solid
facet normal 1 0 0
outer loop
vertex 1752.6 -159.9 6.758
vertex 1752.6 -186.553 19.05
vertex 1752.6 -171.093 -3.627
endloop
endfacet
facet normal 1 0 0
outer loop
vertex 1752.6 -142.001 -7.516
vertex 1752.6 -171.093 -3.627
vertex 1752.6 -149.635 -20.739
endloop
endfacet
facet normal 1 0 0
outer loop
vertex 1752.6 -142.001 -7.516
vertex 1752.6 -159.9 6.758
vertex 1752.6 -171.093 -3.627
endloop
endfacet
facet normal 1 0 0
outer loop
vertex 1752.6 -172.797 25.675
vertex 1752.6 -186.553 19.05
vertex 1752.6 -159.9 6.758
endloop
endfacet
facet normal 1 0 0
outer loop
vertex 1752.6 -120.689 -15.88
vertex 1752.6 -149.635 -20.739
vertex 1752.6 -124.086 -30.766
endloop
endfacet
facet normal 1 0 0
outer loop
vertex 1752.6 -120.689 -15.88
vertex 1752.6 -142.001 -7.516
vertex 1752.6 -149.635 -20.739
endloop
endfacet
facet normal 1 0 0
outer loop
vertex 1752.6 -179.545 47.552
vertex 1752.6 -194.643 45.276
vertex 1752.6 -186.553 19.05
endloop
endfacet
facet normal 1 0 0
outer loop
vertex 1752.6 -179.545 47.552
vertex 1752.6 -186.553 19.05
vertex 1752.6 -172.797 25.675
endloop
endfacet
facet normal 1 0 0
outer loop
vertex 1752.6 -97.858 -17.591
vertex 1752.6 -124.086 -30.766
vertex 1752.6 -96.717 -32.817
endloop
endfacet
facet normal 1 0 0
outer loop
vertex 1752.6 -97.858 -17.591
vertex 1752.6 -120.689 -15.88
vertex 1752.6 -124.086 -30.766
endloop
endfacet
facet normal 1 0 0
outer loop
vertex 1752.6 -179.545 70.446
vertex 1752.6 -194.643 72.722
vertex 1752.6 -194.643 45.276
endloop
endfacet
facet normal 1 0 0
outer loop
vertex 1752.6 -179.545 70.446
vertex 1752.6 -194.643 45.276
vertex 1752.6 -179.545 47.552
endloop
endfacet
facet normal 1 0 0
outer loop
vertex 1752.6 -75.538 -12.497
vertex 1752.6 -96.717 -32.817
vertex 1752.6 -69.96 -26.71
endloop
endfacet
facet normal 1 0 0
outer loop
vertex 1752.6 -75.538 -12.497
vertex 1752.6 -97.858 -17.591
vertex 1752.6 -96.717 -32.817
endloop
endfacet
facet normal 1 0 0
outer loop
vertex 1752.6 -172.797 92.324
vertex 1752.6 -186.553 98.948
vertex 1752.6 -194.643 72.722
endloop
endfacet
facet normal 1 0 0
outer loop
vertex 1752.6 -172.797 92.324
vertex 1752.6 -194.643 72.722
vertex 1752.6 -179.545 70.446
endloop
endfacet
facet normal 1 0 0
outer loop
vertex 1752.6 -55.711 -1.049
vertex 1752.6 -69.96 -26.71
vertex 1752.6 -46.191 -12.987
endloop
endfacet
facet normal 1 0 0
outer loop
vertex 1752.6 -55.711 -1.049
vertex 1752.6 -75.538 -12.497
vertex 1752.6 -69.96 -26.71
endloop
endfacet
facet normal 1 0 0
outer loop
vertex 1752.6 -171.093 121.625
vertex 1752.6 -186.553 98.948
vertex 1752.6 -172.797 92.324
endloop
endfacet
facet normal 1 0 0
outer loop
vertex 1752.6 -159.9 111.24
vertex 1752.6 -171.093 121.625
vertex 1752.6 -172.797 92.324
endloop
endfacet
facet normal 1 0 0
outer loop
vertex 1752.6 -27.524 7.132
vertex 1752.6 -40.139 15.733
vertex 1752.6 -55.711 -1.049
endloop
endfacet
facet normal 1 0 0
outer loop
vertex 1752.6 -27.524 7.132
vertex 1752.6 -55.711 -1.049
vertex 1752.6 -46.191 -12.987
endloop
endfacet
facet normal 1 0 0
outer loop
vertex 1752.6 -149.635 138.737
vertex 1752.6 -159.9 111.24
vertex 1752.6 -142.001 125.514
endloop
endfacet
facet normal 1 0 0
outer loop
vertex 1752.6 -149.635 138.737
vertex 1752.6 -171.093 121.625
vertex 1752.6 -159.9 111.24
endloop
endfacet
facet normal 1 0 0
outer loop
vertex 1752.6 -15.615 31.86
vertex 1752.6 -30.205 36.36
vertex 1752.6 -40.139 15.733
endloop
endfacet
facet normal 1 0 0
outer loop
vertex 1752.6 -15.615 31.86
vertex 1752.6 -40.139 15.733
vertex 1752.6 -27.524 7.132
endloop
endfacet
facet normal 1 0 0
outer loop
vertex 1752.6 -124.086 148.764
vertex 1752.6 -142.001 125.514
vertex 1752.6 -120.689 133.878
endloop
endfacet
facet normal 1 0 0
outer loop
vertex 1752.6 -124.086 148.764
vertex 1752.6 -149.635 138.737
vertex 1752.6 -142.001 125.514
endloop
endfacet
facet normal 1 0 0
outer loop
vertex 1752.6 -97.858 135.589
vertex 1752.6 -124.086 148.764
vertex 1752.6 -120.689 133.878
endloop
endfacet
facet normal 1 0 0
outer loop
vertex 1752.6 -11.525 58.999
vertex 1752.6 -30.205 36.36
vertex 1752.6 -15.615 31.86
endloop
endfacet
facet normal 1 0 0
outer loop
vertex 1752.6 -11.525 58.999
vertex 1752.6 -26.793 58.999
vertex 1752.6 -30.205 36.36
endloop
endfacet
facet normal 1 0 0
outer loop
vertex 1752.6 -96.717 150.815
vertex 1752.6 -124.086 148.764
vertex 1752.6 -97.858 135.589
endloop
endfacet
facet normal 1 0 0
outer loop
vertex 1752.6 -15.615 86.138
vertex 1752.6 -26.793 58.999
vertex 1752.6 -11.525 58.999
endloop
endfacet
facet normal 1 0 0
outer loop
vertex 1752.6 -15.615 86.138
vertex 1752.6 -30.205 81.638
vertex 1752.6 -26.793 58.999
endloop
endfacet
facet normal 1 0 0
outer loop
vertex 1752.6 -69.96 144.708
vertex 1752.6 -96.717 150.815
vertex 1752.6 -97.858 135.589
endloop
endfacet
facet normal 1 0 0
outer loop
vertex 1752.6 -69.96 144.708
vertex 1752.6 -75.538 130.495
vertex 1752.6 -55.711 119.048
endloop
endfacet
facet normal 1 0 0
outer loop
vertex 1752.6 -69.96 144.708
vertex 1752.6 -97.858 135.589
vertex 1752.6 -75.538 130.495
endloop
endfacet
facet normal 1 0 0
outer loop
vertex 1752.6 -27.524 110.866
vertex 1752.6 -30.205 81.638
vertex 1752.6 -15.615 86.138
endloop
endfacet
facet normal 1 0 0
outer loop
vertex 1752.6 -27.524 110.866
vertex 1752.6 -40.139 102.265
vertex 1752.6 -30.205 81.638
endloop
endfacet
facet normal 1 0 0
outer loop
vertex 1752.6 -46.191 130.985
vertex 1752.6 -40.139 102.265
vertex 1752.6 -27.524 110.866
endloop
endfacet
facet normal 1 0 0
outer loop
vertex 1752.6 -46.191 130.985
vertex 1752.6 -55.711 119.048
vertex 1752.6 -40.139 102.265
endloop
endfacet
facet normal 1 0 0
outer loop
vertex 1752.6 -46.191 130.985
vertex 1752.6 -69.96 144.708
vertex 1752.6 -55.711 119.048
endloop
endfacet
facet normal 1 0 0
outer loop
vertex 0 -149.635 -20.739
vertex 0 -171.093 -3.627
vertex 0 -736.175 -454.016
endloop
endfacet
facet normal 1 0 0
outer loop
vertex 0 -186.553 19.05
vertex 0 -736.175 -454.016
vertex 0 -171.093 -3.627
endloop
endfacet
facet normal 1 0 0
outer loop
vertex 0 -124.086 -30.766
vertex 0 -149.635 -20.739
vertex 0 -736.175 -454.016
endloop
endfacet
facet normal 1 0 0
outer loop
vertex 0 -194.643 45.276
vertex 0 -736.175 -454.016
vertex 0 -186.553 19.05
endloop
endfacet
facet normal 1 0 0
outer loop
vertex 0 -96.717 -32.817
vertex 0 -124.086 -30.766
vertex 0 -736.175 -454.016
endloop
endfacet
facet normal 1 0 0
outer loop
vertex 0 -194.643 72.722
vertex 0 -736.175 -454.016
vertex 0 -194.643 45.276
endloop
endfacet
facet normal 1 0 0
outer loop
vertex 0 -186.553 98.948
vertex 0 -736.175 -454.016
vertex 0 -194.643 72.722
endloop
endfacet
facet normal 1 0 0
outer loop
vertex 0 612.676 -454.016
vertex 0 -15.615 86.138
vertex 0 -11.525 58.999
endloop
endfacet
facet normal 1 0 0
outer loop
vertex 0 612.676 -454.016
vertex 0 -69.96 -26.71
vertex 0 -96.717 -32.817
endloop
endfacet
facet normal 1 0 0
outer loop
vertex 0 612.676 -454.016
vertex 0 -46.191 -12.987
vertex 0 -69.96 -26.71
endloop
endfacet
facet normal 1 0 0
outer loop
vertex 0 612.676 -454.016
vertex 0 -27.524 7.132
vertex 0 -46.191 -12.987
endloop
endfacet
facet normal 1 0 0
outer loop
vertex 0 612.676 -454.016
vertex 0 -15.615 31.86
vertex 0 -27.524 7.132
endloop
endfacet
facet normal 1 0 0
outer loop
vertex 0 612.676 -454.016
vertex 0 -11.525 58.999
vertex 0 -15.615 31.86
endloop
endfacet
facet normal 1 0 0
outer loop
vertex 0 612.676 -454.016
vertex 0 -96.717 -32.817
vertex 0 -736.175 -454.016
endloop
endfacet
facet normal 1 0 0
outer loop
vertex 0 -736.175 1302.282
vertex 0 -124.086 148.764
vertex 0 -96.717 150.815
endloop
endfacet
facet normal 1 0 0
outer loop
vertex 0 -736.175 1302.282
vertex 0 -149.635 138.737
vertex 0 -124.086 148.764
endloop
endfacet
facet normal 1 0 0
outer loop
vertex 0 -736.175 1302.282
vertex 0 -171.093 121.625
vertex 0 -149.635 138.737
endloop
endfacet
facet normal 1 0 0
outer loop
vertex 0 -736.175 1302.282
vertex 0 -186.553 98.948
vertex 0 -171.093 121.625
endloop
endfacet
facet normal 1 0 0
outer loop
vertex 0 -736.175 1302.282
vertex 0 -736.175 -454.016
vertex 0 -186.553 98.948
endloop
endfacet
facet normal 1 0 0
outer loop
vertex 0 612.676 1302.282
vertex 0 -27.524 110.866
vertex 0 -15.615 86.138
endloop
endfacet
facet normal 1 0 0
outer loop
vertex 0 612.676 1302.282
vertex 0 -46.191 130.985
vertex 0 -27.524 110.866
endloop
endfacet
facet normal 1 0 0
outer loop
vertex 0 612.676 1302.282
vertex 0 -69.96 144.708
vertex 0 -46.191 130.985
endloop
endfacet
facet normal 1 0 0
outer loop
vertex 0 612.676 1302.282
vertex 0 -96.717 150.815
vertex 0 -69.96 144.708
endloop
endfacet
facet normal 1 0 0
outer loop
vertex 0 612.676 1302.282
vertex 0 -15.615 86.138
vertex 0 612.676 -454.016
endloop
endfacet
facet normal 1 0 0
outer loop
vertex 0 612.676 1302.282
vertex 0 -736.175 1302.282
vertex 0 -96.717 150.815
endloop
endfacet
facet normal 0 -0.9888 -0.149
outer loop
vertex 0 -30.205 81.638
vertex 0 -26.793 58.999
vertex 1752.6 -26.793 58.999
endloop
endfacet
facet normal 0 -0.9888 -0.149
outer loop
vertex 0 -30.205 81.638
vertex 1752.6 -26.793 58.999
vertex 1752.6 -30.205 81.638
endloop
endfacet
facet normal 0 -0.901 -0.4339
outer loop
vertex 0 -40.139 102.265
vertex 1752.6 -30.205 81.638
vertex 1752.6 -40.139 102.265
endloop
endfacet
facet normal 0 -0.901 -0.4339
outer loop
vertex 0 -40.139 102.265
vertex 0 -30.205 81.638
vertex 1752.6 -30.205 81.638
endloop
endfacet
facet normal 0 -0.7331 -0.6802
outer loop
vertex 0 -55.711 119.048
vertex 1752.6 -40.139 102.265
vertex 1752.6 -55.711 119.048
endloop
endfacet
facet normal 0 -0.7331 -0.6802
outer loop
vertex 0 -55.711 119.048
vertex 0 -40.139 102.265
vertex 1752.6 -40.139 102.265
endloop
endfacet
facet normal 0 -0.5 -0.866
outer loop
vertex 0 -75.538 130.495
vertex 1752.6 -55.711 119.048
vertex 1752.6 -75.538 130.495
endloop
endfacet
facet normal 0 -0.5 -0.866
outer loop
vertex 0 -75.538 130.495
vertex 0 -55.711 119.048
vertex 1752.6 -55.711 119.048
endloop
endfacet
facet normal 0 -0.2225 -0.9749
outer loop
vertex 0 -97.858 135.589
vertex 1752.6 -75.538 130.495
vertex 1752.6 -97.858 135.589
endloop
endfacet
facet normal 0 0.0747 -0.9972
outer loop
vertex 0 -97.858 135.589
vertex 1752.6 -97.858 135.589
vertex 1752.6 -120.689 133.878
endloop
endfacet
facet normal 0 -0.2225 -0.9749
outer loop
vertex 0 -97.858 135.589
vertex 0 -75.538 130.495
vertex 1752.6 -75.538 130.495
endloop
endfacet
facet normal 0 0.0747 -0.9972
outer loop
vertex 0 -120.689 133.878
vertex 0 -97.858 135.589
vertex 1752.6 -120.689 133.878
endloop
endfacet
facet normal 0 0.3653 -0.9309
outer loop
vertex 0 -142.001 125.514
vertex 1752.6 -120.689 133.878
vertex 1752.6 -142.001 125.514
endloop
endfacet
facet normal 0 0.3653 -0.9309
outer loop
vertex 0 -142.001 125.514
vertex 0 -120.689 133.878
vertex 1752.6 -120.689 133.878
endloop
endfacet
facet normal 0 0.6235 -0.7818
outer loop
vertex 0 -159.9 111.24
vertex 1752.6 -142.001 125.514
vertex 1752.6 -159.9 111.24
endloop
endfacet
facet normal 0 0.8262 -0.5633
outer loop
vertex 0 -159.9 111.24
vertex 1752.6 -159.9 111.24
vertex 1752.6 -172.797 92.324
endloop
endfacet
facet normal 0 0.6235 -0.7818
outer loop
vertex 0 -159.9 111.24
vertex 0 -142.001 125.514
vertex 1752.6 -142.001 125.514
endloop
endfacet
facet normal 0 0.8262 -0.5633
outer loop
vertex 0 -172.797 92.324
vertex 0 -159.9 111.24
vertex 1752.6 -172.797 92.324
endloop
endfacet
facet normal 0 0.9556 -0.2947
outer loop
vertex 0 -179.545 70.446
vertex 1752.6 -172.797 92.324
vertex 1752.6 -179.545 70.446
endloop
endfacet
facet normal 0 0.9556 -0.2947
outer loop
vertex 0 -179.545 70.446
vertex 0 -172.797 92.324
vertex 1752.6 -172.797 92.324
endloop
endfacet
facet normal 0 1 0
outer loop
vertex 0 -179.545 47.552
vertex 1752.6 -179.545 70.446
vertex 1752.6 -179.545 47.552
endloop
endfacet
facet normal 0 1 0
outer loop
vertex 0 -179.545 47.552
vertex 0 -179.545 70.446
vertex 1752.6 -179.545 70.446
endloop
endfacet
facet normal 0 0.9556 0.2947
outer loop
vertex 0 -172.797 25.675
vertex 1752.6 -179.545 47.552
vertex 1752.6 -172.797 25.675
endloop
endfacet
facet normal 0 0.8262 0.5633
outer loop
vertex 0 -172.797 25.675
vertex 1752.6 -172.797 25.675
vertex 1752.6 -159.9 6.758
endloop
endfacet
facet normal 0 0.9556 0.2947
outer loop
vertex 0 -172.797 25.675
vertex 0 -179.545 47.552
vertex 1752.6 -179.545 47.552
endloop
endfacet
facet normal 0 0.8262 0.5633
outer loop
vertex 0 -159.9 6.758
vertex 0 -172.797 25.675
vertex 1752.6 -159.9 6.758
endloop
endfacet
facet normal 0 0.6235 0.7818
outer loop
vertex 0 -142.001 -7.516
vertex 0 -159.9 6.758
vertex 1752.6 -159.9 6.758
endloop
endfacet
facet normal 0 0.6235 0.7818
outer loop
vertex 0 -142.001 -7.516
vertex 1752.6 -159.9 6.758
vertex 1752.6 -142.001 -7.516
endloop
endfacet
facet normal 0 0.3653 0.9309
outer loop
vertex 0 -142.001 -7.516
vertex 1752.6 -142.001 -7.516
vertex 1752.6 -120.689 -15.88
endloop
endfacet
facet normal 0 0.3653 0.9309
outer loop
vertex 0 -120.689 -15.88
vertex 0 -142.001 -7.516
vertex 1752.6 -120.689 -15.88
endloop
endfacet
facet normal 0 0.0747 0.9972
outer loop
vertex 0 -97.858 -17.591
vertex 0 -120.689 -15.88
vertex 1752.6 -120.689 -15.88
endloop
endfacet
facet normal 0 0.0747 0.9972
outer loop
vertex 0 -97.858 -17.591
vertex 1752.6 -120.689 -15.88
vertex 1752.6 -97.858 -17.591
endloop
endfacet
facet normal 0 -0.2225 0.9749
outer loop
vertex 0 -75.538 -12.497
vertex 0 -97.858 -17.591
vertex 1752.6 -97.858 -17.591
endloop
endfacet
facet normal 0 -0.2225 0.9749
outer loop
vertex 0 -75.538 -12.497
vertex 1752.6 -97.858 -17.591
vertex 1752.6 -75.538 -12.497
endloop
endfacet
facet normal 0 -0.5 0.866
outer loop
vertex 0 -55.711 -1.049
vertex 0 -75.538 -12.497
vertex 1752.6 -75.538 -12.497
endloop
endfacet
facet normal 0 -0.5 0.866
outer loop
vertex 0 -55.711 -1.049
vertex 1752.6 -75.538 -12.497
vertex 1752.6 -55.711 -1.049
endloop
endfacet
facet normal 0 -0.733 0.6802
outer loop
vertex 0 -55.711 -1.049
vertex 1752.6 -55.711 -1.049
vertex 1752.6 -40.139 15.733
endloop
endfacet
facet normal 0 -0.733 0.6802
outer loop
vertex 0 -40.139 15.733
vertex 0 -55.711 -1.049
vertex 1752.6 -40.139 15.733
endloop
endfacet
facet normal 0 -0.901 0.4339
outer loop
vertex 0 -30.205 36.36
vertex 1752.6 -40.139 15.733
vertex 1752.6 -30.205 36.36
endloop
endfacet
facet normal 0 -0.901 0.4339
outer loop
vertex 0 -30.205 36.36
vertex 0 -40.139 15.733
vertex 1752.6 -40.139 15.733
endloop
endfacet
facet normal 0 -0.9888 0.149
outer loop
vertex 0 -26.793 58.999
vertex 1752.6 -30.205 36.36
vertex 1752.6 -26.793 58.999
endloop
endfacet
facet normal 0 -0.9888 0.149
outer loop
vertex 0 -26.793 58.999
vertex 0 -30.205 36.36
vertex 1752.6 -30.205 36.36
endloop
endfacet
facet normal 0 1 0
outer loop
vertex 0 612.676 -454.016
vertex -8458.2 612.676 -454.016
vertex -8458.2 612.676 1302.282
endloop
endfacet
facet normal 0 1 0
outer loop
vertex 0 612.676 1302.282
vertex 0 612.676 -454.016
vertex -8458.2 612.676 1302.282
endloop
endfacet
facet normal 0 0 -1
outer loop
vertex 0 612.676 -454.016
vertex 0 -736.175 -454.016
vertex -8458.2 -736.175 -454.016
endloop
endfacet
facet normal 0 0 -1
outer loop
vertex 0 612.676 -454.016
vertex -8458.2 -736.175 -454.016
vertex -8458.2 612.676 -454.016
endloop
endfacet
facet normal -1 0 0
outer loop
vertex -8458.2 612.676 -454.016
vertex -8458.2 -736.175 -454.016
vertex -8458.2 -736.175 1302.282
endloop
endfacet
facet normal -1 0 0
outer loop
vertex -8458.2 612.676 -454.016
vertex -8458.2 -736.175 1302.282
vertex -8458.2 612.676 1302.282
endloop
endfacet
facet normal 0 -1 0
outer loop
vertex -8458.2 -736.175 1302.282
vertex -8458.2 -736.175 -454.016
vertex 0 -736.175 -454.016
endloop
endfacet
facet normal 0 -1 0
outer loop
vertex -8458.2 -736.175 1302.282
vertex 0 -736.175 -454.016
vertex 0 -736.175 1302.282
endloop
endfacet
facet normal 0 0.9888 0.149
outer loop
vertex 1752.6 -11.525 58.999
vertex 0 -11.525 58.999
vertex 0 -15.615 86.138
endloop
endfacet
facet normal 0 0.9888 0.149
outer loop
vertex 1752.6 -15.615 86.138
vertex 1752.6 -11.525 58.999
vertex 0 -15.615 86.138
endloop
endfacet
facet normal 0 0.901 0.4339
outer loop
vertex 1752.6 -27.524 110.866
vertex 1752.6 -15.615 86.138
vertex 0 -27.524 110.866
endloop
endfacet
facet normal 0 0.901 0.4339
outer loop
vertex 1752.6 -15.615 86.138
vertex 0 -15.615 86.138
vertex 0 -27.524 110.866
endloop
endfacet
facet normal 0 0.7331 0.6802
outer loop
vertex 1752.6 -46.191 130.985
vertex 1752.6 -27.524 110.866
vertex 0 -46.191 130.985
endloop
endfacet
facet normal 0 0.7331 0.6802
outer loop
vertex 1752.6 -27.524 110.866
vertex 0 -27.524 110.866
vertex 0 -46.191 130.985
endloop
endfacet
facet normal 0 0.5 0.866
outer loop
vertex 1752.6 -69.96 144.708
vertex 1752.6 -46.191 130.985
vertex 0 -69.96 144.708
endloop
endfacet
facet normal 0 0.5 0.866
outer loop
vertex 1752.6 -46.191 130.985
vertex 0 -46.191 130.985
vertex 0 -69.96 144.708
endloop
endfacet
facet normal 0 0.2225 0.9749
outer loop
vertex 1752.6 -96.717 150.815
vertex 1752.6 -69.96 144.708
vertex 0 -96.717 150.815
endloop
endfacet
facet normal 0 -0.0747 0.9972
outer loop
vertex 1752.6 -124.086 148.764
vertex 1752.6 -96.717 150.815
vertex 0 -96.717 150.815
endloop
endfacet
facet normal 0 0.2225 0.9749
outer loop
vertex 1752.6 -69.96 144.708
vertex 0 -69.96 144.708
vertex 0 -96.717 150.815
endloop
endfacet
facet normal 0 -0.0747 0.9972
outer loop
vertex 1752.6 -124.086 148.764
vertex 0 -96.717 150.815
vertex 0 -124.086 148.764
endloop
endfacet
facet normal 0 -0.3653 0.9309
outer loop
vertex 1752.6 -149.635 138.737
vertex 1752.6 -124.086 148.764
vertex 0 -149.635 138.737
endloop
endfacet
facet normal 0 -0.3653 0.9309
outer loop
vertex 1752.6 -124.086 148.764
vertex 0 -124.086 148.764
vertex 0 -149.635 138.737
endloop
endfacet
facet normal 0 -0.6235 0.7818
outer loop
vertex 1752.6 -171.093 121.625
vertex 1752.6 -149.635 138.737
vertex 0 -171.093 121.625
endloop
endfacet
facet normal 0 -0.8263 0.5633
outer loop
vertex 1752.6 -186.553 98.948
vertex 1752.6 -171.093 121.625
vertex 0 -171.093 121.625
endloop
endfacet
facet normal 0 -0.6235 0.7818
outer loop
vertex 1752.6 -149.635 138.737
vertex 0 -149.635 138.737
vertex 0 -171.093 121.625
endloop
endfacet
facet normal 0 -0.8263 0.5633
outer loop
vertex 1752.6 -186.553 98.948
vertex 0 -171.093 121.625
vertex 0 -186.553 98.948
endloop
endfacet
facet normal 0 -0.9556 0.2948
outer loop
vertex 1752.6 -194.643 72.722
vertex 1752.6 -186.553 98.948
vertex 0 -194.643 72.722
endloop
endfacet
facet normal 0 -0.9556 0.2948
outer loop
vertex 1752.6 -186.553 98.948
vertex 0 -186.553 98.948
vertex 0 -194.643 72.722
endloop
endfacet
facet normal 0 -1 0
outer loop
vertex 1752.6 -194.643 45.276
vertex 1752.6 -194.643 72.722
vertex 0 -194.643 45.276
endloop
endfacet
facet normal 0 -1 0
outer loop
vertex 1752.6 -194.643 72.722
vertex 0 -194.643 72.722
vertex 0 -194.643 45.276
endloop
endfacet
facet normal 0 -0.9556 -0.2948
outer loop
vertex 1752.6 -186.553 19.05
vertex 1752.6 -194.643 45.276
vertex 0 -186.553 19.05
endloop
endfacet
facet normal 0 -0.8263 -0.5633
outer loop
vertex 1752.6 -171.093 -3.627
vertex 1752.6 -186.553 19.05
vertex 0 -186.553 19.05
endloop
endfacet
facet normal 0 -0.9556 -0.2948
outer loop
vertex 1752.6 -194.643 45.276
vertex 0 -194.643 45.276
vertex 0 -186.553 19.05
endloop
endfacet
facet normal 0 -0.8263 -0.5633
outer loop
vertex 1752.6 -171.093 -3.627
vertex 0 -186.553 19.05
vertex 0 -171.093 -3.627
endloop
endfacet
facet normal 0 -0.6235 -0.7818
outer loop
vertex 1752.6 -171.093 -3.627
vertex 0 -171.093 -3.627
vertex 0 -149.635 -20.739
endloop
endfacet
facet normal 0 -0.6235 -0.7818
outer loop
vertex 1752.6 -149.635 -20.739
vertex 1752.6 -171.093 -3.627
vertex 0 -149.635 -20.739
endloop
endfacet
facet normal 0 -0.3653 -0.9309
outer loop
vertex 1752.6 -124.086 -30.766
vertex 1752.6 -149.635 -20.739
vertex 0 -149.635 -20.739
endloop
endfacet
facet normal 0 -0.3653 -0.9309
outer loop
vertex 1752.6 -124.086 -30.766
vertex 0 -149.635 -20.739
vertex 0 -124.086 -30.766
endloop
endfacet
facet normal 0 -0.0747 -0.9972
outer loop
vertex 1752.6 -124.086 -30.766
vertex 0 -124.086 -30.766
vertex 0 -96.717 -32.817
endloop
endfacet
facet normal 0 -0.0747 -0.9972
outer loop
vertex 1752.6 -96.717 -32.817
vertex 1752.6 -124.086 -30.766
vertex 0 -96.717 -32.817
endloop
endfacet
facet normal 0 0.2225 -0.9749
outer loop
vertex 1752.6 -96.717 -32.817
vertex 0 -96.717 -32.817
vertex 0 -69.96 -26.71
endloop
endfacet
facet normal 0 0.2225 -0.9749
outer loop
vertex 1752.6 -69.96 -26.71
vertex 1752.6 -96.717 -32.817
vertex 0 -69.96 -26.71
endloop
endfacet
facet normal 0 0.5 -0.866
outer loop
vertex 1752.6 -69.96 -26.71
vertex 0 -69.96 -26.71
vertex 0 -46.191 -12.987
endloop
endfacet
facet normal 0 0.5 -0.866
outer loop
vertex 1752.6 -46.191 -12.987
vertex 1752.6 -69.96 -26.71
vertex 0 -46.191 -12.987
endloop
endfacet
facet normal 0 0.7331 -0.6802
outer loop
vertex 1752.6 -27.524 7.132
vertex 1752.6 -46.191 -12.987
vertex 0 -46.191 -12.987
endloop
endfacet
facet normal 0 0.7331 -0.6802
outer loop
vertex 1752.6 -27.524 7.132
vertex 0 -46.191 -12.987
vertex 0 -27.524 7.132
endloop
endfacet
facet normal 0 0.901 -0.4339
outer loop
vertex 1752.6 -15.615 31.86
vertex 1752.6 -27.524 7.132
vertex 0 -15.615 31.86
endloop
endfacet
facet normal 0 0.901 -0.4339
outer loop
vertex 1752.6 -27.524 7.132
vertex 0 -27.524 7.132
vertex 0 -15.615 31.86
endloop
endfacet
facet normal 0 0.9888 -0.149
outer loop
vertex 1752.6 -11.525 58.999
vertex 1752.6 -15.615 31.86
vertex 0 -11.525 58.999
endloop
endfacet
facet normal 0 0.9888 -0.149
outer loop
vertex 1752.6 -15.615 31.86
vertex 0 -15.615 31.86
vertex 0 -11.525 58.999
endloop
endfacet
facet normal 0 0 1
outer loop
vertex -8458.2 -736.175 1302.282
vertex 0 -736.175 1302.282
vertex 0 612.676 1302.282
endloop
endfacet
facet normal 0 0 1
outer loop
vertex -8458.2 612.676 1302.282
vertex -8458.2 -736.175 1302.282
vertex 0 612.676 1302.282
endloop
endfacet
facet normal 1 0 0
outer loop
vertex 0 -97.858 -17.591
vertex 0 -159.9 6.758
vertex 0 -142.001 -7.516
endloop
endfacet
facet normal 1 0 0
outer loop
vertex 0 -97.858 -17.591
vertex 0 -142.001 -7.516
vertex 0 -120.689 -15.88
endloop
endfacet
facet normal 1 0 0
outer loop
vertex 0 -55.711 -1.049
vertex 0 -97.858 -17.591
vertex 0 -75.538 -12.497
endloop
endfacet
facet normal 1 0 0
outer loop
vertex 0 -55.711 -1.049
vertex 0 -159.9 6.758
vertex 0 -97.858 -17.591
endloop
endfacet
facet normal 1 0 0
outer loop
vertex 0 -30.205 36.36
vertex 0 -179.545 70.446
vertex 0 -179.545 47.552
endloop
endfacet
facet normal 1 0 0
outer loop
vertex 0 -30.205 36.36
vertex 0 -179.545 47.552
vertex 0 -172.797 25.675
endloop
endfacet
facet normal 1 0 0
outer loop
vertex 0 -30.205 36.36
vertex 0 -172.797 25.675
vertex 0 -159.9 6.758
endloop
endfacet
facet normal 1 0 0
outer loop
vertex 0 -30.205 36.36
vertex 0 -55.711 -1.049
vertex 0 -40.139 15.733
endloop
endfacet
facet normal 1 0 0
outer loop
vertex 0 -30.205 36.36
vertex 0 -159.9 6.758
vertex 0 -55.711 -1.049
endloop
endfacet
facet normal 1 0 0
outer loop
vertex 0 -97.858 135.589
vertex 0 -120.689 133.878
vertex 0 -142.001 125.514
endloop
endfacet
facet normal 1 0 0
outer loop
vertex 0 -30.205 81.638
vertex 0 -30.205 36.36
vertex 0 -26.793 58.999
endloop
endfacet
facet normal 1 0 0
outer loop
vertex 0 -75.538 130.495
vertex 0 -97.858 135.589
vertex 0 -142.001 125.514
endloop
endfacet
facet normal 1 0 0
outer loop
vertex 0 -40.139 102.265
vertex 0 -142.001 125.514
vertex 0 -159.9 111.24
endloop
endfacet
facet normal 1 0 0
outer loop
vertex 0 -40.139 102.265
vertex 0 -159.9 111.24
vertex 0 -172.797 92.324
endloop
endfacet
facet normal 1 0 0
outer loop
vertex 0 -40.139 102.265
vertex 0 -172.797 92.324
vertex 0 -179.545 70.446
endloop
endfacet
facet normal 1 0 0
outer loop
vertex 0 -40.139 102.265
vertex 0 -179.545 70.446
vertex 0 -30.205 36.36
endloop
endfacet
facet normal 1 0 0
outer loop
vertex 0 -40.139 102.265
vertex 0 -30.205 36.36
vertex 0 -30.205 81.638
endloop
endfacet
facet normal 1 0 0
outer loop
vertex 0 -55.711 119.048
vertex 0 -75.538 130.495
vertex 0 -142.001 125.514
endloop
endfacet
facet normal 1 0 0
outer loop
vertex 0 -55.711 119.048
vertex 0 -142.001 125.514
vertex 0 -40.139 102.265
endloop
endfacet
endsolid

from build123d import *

# Parameters (mm, degrees)
F0_R     = 92.07329
F0_R_2   = 76.804946
F1_DEPTH = 1752.6
F2_W     = 1348.850906
F2_H     = 1756.297738
F3_DEPTH = 8458.2


with BuildPart() as f1:
    # F0 (on Right) → F1 (new body)
    with BuildSketch(Plane.YZ):
        with Locations((-103.598125, 58.999091)):
            Circle(F0_R)
        with Locations((-103.598125, 58.999091)):
            Circle(F0_R_2, mode=Mode.SUBTRACT)
    extrude(amount=F1_DEPTH)

    # F2 (on Right) → F3 (join)
    with BuildSketch(Plane.YZ):
        with Locations((-61.749667, 424.132988)):
            Rectangle(F2_W, F2_H)
    extrude(amount=-F3_DEPTH)


solid = f1.part
